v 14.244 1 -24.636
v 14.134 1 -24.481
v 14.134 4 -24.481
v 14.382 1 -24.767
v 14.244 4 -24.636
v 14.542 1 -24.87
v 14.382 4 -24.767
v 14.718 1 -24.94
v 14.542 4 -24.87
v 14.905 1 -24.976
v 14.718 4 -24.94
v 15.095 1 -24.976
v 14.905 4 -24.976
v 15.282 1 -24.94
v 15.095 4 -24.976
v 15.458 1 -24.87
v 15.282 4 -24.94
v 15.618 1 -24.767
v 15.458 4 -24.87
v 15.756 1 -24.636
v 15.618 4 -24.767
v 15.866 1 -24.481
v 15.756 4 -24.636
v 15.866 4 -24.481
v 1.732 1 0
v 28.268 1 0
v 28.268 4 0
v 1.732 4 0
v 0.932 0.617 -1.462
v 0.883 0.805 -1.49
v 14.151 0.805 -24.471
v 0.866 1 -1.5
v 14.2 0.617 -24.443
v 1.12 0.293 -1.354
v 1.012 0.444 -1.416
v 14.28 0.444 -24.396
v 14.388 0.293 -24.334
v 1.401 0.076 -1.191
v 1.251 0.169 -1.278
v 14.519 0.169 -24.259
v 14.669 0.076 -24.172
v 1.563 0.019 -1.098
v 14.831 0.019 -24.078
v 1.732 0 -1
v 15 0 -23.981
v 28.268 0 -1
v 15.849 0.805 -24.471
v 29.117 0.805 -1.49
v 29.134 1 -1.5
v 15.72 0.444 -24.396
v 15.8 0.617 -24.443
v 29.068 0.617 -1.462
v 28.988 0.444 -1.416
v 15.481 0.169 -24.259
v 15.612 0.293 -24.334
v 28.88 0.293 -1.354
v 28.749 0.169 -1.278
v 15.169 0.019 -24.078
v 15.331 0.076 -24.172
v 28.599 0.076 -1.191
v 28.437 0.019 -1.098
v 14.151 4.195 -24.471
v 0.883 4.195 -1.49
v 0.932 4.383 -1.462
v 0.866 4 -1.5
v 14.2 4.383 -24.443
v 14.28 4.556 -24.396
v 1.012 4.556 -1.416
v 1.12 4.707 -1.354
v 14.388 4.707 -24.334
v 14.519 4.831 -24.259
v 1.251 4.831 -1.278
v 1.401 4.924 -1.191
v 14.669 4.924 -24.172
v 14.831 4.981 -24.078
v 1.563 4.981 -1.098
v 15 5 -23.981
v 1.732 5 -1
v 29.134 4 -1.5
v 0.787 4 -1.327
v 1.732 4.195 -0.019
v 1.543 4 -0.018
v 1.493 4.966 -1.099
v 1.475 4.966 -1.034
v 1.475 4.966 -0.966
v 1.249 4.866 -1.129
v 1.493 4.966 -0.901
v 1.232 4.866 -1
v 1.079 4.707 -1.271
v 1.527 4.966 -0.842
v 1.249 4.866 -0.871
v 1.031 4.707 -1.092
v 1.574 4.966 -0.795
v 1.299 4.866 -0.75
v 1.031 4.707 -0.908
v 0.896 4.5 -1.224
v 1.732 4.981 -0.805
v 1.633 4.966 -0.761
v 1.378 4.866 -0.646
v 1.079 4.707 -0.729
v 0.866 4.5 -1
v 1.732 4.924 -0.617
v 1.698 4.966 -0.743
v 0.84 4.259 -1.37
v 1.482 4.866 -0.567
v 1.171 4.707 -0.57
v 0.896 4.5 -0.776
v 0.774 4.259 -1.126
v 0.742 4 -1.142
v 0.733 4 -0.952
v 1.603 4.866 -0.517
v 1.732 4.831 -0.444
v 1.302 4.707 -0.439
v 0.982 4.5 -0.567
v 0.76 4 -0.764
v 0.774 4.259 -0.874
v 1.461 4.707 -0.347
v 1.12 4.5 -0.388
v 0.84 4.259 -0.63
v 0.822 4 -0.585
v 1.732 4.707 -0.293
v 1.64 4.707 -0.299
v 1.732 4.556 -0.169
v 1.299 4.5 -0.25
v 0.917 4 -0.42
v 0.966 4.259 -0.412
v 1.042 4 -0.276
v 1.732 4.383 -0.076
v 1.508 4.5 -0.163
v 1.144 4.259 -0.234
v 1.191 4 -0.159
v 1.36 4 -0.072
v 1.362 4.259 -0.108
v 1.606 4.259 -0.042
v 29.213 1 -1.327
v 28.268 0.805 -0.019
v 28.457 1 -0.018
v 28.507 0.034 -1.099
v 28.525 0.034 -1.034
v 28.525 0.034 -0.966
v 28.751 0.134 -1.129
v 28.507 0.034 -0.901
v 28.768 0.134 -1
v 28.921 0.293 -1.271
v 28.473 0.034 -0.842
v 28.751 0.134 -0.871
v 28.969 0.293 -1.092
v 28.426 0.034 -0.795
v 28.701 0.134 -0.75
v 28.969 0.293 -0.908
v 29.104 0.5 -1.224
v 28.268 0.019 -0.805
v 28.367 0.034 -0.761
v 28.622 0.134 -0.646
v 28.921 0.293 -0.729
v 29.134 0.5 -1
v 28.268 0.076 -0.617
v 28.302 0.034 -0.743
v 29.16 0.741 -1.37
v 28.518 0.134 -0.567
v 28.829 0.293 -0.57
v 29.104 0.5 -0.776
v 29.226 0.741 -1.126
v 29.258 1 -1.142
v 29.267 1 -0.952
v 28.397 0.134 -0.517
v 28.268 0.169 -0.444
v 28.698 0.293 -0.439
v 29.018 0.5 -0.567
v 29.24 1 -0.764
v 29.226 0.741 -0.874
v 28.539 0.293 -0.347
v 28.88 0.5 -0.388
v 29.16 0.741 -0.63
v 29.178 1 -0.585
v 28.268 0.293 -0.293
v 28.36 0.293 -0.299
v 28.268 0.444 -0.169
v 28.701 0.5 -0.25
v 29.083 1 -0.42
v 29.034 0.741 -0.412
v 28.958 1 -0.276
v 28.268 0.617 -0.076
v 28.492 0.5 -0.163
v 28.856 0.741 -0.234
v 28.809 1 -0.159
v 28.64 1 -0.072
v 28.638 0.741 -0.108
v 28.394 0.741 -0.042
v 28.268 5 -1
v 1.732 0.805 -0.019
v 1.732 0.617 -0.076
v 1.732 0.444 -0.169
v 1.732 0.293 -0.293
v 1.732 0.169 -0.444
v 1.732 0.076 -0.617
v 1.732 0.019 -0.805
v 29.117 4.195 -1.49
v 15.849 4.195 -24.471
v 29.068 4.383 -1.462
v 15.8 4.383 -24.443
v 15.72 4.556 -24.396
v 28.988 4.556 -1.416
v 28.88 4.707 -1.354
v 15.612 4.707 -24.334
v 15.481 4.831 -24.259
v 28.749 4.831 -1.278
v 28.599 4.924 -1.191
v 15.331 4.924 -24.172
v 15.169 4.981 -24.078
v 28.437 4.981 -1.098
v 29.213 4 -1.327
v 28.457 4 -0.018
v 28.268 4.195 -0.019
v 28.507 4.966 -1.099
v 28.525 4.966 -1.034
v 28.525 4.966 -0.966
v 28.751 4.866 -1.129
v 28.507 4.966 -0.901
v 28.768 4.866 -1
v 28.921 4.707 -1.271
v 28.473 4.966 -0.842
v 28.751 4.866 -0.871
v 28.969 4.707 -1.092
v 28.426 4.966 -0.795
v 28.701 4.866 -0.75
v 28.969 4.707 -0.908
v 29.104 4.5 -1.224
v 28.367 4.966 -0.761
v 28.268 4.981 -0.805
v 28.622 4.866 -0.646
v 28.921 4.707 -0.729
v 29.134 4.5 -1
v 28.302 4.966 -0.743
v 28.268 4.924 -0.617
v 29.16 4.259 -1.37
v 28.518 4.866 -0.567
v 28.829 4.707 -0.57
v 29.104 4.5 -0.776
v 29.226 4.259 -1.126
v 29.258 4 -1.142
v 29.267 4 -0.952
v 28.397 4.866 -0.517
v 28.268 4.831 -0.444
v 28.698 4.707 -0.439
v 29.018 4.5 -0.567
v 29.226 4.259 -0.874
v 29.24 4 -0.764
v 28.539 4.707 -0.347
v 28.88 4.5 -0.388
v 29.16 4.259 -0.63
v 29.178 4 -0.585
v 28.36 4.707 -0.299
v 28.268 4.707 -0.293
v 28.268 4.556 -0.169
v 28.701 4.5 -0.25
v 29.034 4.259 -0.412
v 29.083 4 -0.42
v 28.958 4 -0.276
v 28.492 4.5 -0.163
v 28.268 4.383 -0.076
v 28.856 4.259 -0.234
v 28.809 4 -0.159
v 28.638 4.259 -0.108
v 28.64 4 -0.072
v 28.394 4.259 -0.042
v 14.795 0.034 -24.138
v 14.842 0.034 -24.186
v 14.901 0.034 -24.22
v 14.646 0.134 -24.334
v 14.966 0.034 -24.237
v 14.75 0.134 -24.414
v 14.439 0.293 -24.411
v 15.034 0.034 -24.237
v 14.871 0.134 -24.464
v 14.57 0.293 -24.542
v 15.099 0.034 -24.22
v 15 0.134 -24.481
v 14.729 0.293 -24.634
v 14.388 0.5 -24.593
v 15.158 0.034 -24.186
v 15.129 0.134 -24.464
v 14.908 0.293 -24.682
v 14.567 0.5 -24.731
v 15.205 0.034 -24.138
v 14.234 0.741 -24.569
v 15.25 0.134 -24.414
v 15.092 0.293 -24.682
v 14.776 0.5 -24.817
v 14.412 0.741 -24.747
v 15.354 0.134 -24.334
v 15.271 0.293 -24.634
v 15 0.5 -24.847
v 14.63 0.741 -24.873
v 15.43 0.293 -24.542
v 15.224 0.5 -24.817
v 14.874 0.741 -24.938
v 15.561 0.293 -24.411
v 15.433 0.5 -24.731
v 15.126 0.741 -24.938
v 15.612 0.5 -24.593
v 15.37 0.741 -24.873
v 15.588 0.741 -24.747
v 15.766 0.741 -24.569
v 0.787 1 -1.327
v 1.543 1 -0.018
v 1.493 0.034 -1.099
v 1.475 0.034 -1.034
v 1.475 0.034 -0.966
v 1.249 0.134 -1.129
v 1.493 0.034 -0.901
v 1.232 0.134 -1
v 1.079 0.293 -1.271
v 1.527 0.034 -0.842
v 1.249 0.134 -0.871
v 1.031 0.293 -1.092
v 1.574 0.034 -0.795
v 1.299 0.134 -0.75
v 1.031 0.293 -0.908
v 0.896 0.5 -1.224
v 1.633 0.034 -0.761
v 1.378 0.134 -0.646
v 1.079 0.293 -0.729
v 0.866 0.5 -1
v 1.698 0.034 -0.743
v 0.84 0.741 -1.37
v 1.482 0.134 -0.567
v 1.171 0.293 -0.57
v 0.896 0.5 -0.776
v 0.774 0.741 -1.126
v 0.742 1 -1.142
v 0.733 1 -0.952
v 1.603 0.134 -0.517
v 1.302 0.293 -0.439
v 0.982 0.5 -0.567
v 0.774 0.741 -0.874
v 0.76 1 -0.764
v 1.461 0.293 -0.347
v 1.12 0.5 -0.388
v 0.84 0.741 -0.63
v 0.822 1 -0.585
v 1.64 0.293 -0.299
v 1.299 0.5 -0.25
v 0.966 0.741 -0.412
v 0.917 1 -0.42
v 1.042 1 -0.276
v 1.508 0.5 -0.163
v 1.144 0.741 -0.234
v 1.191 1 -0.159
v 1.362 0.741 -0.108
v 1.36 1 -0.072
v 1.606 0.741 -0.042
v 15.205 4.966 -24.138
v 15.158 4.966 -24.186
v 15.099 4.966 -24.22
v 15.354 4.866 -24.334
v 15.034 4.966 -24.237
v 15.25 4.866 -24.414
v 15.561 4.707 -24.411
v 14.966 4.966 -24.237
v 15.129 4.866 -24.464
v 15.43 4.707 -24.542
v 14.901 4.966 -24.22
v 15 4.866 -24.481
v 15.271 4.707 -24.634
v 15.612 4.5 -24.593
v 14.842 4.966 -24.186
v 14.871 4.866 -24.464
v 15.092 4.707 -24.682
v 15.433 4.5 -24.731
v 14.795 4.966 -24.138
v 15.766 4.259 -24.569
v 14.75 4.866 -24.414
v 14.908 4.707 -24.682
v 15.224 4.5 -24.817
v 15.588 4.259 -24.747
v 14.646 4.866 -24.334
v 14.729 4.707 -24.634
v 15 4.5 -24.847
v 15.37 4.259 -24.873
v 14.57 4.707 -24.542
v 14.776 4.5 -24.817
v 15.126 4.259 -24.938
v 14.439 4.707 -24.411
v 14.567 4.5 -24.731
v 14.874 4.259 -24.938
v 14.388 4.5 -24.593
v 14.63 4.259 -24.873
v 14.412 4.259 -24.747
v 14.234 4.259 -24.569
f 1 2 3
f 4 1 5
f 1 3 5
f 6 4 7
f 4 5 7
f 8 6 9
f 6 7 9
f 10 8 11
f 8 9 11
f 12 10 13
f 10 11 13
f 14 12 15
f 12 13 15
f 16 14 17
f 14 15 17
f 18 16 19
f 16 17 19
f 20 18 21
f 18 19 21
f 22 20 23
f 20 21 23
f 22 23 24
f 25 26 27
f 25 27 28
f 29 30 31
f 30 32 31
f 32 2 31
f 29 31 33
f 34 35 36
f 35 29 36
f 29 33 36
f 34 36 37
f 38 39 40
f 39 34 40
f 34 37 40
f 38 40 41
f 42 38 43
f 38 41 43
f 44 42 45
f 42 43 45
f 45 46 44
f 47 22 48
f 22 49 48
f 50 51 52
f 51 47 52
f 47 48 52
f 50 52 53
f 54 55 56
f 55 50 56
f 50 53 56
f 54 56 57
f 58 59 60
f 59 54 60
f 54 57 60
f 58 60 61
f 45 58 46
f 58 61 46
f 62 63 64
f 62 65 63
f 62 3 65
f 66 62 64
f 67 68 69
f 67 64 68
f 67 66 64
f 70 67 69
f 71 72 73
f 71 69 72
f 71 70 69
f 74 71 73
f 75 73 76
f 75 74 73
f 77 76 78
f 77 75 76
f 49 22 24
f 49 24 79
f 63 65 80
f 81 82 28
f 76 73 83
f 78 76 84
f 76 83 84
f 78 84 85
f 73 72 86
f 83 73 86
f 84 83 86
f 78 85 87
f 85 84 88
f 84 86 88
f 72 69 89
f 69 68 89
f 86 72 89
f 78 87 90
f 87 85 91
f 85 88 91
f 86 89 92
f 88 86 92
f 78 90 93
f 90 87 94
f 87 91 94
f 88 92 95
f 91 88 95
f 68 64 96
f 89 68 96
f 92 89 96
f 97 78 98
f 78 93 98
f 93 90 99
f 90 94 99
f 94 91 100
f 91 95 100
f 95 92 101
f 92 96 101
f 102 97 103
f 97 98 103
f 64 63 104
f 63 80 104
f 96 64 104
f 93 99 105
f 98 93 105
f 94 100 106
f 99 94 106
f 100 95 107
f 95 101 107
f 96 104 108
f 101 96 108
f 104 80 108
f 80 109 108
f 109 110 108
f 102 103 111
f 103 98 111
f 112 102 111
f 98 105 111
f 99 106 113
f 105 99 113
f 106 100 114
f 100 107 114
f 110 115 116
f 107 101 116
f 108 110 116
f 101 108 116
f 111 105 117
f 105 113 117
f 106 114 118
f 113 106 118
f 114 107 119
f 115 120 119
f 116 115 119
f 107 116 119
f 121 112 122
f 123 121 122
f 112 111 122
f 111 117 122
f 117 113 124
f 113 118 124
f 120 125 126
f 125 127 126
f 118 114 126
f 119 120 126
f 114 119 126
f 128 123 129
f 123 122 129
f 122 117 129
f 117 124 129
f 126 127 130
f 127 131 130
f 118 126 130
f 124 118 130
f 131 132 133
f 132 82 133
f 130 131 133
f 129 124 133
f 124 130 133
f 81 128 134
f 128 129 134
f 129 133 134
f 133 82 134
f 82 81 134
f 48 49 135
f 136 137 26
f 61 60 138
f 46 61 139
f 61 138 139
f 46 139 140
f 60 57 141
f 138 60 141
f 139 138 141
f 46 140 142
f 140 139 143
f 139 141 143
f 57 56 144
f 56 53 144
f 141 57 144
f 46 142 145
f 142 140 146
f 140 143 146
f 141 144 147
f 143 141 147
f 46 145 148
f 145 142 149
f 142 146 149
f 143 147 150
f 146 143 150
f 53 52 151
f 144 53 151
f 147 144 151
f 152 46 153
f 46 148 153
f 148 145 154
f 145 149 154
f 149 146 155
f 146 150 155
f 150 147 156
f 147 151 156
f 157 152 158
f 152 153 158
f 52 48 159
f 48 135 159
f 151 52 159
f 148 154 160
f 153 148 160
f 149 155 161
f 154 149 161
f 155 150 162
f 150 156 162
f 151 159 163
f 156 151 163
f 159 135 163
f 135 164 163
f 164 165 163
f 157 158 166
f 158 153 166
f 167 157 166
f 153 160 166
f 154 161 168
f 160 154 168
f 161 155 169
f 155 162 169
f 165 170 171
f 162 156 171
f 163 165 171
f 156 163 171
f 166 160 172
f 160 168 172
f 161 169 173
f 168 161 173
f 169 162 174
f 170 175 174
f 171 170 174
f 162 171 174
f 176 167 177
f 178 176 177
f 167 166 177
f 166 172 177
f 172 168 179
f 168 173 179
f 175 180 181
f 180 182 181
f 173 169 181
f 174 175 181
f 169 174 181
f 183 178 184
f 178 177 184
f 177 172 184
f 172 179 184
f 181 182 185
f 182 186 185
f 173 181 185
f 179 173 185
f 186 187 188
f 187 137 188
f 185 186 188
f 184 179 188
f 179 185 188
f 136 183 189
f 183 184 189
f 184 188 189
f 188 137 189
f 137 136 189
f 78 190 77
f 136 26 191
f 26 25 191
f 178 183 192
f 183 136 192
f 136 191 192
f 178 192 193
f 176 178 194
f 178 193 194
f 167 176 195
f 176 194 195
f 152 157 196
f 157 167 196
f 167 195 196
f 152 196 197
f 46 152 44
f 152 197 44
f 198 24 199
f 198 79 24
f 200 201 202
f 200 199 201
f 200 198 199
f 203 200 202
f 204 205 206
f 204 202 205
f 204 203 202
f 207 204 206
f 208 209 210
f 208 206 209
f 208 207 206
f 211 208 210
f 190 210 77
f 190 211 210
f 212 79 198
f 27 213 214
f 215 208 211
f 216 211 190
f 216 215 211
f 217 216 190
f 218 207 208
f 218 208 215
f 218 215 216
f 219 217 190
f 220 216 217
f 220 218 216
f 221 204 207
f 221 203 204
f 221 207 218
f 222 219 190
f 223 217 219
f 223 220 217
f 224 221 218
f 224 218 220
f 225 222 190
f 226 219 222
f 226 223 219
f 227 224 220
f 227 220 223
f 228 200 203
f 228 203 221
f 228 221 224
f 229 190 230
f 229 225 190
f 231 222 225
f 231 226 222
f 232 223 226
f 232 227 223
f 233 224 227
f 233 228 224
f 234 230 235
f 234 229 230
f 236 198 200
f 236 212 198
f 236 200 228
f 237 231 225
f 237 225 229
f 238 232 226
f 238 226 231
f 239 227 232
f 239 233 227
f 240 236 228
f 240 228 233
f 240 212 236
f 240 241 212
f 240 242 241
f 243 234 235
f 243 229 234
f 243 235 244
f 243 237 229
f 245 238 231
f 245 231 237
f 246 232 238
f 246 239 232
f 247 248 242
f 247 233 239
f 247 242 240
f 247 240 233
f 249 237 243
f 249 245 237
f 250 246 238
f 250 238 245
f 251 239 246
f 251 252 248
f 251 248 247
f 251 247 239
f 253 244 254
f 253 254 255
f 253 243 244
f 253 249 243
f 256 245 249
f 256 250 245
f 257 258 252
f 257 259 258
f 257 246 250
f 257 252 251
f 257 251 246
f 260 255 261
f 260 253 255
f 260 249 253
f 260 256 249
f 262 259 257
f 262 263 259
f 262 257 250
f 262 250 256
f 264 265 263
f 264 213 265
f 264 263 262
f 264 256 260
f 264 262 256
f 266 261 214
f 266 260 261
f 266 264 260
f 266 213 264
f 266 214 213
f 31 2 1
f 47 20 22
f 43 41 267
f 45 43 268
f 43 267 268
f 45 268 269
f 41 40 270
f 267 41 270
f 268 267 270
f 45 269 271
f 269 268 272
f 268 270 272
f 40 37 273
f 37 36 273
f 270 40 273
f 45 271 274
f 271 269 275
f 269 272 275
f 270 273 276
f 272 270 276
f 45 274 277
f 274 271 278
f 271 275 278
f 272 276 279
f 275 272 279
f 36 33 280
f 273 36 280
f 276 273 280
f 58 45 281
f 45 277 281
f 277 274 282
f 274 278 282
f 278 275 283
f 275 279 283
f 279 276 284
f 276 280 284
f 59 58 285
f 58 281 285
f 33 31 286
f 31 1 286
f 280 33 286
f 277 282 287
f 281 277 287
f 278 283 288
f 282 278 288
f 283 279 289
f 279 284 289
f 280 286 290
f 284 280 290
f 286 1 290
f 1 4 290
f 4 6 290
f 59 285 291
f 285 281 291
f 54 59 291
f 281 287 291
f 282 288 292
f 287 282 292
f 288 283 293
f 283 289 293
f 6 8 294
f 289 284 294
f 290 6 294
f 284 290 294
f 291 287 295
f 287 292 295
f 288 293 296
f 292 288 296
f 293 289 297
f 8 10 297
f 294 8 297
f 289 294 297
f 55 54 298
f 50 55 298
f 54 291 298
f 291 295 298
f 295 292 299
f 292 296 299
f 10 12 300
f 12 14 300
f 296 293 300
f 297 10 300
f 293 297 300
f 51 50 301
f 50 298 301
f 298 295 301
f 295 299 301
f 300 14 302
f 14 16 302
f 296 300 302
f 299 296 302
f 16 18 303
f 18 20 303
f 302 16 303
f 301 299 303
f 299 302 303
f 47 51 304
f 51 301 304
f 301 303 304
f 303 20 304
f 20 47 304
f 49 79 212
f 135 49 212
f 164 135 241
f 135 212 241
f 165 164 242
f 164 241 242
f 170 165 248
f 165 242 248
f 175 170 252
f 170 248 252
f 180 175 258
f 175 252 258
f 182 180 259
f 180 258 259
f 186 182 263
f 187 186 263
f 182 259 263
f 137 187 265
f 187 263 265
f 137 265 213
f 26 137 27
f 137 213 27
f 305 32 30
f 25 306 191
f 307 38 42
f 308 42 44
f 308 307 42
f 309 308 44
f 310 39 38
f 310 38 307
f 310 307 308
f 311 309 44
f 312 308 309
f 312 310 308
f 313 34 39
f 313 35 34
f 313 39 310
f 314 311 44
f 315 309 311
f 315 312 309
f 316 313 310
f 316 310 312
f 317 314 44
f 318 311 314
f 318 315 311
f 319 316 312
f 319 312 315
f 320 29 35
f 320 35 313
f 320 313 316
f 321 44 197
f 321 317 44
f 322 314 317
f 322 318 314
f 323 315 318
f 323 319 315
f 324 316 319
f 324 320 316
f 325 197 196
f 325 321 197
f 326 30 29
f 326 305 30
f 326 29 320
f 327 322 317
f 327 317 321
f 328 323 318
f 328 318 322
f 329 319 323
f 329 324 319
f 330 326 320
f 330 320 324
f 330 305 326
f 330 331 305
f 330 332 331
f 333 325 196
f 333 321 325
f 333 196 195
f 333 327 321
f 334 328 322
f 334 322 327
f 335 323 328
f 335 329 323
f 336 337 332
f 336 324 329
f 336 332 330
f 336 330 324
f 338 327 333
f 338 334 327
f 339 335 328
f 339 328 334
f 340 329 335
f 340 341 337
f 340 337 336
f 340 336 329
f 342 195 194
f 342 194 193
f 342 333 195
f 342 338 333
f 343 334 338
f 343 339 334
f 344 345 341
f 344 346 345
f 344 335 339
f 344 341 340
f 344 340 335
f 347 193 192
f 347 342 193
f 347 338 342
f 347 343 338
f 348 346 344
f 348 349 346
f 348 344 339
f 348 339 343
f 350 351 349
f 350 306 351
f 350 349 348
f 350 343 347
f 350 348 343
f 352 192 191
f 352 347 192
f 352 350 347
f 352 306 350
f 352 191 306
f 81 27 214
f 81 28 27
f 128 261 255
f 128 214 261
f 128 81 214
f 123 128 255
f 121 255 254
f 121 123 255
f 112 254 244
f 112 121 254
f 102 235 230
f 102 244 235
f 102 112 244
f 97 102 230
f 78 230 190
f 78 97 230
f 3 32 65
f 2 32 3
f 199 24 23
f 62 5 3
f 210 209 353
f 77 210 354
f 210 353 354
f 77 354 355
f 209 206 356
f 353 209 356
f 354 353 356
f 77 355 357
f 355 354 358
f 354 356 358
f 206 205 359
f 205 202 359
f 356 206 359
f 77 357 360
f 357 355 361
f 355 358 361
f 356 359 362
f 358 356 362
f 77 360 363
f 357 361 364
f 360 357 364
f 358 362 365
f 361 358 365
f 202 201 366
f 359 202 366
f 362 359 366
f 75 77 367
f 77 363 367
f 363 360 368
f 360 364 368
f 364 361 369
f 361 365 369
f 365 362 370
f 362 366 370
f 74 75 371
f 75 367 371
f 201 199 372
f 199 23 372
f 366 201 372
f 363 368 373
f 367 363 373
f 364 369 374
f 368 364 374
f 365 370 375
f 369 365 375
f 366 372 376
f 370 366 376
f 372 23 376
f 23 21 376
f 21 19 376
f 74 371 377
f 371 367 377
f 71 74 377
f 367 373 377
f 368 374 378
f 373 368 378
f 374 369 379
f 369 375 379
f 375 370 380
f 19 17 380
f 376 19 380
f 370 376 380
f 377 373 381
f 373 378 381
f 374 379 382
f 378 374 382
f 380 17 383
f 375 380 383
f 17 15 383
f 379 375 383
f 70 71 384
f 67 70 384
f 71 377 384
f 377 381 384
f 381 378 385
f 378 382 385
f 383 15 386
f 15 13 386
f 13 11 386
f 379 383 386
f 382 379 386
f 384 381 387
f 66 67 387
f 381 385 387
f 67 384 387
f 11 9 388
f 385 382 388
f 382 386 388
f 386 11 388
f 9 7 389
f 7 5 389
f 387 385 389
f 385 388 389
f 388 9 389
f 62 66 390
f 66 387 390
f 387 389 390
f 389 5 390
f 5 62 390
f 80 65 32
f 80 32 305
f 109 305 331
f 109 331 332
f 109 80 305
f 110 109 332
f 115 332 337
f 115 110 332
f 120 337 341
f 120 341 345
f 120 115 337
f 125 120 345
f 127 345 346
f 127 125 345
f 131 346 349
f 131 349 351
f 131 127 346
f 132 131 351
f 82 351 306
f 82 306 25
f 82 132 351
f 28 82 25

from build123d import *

# Parameters (mm, degrees)
BOSS_EXTRUDE1_DEPTH = 5
FILLET1_R           = 1


with BuildPart() as part:
    # Sketch1 → Boss-Extrude1 (new body)
    with BuildSketch(Plane(origin=(0, 0, 0), x_dir=(1, 0, 0), z_dir=(0, 1, 0))):
        Polygon((0, 0), (15, 25.980762114), (30, 0), align=None)
    extrude(amount=BOSS_EXTRUDE1_DEPTH)

    # Fillet1
    fillet1_edges = [part.edges().sort_by_distance(p)[0] for p in [
        (7.5, 5, -12.990381057),
        (7.5, 0, -12.990381057),
        (22.5, 0, -12.990381057),
        (15, 0, 0),
        (15, 5, 0),
        (0, 2.5, 0),
        (15, 2.5, -25.980762114),
        (30, 2.5, 0),
        (22.5, 5, -12.990381057),
    ]]
    fillet(fillet1_edges, radius=FILLET1_R)


solid = part.part
